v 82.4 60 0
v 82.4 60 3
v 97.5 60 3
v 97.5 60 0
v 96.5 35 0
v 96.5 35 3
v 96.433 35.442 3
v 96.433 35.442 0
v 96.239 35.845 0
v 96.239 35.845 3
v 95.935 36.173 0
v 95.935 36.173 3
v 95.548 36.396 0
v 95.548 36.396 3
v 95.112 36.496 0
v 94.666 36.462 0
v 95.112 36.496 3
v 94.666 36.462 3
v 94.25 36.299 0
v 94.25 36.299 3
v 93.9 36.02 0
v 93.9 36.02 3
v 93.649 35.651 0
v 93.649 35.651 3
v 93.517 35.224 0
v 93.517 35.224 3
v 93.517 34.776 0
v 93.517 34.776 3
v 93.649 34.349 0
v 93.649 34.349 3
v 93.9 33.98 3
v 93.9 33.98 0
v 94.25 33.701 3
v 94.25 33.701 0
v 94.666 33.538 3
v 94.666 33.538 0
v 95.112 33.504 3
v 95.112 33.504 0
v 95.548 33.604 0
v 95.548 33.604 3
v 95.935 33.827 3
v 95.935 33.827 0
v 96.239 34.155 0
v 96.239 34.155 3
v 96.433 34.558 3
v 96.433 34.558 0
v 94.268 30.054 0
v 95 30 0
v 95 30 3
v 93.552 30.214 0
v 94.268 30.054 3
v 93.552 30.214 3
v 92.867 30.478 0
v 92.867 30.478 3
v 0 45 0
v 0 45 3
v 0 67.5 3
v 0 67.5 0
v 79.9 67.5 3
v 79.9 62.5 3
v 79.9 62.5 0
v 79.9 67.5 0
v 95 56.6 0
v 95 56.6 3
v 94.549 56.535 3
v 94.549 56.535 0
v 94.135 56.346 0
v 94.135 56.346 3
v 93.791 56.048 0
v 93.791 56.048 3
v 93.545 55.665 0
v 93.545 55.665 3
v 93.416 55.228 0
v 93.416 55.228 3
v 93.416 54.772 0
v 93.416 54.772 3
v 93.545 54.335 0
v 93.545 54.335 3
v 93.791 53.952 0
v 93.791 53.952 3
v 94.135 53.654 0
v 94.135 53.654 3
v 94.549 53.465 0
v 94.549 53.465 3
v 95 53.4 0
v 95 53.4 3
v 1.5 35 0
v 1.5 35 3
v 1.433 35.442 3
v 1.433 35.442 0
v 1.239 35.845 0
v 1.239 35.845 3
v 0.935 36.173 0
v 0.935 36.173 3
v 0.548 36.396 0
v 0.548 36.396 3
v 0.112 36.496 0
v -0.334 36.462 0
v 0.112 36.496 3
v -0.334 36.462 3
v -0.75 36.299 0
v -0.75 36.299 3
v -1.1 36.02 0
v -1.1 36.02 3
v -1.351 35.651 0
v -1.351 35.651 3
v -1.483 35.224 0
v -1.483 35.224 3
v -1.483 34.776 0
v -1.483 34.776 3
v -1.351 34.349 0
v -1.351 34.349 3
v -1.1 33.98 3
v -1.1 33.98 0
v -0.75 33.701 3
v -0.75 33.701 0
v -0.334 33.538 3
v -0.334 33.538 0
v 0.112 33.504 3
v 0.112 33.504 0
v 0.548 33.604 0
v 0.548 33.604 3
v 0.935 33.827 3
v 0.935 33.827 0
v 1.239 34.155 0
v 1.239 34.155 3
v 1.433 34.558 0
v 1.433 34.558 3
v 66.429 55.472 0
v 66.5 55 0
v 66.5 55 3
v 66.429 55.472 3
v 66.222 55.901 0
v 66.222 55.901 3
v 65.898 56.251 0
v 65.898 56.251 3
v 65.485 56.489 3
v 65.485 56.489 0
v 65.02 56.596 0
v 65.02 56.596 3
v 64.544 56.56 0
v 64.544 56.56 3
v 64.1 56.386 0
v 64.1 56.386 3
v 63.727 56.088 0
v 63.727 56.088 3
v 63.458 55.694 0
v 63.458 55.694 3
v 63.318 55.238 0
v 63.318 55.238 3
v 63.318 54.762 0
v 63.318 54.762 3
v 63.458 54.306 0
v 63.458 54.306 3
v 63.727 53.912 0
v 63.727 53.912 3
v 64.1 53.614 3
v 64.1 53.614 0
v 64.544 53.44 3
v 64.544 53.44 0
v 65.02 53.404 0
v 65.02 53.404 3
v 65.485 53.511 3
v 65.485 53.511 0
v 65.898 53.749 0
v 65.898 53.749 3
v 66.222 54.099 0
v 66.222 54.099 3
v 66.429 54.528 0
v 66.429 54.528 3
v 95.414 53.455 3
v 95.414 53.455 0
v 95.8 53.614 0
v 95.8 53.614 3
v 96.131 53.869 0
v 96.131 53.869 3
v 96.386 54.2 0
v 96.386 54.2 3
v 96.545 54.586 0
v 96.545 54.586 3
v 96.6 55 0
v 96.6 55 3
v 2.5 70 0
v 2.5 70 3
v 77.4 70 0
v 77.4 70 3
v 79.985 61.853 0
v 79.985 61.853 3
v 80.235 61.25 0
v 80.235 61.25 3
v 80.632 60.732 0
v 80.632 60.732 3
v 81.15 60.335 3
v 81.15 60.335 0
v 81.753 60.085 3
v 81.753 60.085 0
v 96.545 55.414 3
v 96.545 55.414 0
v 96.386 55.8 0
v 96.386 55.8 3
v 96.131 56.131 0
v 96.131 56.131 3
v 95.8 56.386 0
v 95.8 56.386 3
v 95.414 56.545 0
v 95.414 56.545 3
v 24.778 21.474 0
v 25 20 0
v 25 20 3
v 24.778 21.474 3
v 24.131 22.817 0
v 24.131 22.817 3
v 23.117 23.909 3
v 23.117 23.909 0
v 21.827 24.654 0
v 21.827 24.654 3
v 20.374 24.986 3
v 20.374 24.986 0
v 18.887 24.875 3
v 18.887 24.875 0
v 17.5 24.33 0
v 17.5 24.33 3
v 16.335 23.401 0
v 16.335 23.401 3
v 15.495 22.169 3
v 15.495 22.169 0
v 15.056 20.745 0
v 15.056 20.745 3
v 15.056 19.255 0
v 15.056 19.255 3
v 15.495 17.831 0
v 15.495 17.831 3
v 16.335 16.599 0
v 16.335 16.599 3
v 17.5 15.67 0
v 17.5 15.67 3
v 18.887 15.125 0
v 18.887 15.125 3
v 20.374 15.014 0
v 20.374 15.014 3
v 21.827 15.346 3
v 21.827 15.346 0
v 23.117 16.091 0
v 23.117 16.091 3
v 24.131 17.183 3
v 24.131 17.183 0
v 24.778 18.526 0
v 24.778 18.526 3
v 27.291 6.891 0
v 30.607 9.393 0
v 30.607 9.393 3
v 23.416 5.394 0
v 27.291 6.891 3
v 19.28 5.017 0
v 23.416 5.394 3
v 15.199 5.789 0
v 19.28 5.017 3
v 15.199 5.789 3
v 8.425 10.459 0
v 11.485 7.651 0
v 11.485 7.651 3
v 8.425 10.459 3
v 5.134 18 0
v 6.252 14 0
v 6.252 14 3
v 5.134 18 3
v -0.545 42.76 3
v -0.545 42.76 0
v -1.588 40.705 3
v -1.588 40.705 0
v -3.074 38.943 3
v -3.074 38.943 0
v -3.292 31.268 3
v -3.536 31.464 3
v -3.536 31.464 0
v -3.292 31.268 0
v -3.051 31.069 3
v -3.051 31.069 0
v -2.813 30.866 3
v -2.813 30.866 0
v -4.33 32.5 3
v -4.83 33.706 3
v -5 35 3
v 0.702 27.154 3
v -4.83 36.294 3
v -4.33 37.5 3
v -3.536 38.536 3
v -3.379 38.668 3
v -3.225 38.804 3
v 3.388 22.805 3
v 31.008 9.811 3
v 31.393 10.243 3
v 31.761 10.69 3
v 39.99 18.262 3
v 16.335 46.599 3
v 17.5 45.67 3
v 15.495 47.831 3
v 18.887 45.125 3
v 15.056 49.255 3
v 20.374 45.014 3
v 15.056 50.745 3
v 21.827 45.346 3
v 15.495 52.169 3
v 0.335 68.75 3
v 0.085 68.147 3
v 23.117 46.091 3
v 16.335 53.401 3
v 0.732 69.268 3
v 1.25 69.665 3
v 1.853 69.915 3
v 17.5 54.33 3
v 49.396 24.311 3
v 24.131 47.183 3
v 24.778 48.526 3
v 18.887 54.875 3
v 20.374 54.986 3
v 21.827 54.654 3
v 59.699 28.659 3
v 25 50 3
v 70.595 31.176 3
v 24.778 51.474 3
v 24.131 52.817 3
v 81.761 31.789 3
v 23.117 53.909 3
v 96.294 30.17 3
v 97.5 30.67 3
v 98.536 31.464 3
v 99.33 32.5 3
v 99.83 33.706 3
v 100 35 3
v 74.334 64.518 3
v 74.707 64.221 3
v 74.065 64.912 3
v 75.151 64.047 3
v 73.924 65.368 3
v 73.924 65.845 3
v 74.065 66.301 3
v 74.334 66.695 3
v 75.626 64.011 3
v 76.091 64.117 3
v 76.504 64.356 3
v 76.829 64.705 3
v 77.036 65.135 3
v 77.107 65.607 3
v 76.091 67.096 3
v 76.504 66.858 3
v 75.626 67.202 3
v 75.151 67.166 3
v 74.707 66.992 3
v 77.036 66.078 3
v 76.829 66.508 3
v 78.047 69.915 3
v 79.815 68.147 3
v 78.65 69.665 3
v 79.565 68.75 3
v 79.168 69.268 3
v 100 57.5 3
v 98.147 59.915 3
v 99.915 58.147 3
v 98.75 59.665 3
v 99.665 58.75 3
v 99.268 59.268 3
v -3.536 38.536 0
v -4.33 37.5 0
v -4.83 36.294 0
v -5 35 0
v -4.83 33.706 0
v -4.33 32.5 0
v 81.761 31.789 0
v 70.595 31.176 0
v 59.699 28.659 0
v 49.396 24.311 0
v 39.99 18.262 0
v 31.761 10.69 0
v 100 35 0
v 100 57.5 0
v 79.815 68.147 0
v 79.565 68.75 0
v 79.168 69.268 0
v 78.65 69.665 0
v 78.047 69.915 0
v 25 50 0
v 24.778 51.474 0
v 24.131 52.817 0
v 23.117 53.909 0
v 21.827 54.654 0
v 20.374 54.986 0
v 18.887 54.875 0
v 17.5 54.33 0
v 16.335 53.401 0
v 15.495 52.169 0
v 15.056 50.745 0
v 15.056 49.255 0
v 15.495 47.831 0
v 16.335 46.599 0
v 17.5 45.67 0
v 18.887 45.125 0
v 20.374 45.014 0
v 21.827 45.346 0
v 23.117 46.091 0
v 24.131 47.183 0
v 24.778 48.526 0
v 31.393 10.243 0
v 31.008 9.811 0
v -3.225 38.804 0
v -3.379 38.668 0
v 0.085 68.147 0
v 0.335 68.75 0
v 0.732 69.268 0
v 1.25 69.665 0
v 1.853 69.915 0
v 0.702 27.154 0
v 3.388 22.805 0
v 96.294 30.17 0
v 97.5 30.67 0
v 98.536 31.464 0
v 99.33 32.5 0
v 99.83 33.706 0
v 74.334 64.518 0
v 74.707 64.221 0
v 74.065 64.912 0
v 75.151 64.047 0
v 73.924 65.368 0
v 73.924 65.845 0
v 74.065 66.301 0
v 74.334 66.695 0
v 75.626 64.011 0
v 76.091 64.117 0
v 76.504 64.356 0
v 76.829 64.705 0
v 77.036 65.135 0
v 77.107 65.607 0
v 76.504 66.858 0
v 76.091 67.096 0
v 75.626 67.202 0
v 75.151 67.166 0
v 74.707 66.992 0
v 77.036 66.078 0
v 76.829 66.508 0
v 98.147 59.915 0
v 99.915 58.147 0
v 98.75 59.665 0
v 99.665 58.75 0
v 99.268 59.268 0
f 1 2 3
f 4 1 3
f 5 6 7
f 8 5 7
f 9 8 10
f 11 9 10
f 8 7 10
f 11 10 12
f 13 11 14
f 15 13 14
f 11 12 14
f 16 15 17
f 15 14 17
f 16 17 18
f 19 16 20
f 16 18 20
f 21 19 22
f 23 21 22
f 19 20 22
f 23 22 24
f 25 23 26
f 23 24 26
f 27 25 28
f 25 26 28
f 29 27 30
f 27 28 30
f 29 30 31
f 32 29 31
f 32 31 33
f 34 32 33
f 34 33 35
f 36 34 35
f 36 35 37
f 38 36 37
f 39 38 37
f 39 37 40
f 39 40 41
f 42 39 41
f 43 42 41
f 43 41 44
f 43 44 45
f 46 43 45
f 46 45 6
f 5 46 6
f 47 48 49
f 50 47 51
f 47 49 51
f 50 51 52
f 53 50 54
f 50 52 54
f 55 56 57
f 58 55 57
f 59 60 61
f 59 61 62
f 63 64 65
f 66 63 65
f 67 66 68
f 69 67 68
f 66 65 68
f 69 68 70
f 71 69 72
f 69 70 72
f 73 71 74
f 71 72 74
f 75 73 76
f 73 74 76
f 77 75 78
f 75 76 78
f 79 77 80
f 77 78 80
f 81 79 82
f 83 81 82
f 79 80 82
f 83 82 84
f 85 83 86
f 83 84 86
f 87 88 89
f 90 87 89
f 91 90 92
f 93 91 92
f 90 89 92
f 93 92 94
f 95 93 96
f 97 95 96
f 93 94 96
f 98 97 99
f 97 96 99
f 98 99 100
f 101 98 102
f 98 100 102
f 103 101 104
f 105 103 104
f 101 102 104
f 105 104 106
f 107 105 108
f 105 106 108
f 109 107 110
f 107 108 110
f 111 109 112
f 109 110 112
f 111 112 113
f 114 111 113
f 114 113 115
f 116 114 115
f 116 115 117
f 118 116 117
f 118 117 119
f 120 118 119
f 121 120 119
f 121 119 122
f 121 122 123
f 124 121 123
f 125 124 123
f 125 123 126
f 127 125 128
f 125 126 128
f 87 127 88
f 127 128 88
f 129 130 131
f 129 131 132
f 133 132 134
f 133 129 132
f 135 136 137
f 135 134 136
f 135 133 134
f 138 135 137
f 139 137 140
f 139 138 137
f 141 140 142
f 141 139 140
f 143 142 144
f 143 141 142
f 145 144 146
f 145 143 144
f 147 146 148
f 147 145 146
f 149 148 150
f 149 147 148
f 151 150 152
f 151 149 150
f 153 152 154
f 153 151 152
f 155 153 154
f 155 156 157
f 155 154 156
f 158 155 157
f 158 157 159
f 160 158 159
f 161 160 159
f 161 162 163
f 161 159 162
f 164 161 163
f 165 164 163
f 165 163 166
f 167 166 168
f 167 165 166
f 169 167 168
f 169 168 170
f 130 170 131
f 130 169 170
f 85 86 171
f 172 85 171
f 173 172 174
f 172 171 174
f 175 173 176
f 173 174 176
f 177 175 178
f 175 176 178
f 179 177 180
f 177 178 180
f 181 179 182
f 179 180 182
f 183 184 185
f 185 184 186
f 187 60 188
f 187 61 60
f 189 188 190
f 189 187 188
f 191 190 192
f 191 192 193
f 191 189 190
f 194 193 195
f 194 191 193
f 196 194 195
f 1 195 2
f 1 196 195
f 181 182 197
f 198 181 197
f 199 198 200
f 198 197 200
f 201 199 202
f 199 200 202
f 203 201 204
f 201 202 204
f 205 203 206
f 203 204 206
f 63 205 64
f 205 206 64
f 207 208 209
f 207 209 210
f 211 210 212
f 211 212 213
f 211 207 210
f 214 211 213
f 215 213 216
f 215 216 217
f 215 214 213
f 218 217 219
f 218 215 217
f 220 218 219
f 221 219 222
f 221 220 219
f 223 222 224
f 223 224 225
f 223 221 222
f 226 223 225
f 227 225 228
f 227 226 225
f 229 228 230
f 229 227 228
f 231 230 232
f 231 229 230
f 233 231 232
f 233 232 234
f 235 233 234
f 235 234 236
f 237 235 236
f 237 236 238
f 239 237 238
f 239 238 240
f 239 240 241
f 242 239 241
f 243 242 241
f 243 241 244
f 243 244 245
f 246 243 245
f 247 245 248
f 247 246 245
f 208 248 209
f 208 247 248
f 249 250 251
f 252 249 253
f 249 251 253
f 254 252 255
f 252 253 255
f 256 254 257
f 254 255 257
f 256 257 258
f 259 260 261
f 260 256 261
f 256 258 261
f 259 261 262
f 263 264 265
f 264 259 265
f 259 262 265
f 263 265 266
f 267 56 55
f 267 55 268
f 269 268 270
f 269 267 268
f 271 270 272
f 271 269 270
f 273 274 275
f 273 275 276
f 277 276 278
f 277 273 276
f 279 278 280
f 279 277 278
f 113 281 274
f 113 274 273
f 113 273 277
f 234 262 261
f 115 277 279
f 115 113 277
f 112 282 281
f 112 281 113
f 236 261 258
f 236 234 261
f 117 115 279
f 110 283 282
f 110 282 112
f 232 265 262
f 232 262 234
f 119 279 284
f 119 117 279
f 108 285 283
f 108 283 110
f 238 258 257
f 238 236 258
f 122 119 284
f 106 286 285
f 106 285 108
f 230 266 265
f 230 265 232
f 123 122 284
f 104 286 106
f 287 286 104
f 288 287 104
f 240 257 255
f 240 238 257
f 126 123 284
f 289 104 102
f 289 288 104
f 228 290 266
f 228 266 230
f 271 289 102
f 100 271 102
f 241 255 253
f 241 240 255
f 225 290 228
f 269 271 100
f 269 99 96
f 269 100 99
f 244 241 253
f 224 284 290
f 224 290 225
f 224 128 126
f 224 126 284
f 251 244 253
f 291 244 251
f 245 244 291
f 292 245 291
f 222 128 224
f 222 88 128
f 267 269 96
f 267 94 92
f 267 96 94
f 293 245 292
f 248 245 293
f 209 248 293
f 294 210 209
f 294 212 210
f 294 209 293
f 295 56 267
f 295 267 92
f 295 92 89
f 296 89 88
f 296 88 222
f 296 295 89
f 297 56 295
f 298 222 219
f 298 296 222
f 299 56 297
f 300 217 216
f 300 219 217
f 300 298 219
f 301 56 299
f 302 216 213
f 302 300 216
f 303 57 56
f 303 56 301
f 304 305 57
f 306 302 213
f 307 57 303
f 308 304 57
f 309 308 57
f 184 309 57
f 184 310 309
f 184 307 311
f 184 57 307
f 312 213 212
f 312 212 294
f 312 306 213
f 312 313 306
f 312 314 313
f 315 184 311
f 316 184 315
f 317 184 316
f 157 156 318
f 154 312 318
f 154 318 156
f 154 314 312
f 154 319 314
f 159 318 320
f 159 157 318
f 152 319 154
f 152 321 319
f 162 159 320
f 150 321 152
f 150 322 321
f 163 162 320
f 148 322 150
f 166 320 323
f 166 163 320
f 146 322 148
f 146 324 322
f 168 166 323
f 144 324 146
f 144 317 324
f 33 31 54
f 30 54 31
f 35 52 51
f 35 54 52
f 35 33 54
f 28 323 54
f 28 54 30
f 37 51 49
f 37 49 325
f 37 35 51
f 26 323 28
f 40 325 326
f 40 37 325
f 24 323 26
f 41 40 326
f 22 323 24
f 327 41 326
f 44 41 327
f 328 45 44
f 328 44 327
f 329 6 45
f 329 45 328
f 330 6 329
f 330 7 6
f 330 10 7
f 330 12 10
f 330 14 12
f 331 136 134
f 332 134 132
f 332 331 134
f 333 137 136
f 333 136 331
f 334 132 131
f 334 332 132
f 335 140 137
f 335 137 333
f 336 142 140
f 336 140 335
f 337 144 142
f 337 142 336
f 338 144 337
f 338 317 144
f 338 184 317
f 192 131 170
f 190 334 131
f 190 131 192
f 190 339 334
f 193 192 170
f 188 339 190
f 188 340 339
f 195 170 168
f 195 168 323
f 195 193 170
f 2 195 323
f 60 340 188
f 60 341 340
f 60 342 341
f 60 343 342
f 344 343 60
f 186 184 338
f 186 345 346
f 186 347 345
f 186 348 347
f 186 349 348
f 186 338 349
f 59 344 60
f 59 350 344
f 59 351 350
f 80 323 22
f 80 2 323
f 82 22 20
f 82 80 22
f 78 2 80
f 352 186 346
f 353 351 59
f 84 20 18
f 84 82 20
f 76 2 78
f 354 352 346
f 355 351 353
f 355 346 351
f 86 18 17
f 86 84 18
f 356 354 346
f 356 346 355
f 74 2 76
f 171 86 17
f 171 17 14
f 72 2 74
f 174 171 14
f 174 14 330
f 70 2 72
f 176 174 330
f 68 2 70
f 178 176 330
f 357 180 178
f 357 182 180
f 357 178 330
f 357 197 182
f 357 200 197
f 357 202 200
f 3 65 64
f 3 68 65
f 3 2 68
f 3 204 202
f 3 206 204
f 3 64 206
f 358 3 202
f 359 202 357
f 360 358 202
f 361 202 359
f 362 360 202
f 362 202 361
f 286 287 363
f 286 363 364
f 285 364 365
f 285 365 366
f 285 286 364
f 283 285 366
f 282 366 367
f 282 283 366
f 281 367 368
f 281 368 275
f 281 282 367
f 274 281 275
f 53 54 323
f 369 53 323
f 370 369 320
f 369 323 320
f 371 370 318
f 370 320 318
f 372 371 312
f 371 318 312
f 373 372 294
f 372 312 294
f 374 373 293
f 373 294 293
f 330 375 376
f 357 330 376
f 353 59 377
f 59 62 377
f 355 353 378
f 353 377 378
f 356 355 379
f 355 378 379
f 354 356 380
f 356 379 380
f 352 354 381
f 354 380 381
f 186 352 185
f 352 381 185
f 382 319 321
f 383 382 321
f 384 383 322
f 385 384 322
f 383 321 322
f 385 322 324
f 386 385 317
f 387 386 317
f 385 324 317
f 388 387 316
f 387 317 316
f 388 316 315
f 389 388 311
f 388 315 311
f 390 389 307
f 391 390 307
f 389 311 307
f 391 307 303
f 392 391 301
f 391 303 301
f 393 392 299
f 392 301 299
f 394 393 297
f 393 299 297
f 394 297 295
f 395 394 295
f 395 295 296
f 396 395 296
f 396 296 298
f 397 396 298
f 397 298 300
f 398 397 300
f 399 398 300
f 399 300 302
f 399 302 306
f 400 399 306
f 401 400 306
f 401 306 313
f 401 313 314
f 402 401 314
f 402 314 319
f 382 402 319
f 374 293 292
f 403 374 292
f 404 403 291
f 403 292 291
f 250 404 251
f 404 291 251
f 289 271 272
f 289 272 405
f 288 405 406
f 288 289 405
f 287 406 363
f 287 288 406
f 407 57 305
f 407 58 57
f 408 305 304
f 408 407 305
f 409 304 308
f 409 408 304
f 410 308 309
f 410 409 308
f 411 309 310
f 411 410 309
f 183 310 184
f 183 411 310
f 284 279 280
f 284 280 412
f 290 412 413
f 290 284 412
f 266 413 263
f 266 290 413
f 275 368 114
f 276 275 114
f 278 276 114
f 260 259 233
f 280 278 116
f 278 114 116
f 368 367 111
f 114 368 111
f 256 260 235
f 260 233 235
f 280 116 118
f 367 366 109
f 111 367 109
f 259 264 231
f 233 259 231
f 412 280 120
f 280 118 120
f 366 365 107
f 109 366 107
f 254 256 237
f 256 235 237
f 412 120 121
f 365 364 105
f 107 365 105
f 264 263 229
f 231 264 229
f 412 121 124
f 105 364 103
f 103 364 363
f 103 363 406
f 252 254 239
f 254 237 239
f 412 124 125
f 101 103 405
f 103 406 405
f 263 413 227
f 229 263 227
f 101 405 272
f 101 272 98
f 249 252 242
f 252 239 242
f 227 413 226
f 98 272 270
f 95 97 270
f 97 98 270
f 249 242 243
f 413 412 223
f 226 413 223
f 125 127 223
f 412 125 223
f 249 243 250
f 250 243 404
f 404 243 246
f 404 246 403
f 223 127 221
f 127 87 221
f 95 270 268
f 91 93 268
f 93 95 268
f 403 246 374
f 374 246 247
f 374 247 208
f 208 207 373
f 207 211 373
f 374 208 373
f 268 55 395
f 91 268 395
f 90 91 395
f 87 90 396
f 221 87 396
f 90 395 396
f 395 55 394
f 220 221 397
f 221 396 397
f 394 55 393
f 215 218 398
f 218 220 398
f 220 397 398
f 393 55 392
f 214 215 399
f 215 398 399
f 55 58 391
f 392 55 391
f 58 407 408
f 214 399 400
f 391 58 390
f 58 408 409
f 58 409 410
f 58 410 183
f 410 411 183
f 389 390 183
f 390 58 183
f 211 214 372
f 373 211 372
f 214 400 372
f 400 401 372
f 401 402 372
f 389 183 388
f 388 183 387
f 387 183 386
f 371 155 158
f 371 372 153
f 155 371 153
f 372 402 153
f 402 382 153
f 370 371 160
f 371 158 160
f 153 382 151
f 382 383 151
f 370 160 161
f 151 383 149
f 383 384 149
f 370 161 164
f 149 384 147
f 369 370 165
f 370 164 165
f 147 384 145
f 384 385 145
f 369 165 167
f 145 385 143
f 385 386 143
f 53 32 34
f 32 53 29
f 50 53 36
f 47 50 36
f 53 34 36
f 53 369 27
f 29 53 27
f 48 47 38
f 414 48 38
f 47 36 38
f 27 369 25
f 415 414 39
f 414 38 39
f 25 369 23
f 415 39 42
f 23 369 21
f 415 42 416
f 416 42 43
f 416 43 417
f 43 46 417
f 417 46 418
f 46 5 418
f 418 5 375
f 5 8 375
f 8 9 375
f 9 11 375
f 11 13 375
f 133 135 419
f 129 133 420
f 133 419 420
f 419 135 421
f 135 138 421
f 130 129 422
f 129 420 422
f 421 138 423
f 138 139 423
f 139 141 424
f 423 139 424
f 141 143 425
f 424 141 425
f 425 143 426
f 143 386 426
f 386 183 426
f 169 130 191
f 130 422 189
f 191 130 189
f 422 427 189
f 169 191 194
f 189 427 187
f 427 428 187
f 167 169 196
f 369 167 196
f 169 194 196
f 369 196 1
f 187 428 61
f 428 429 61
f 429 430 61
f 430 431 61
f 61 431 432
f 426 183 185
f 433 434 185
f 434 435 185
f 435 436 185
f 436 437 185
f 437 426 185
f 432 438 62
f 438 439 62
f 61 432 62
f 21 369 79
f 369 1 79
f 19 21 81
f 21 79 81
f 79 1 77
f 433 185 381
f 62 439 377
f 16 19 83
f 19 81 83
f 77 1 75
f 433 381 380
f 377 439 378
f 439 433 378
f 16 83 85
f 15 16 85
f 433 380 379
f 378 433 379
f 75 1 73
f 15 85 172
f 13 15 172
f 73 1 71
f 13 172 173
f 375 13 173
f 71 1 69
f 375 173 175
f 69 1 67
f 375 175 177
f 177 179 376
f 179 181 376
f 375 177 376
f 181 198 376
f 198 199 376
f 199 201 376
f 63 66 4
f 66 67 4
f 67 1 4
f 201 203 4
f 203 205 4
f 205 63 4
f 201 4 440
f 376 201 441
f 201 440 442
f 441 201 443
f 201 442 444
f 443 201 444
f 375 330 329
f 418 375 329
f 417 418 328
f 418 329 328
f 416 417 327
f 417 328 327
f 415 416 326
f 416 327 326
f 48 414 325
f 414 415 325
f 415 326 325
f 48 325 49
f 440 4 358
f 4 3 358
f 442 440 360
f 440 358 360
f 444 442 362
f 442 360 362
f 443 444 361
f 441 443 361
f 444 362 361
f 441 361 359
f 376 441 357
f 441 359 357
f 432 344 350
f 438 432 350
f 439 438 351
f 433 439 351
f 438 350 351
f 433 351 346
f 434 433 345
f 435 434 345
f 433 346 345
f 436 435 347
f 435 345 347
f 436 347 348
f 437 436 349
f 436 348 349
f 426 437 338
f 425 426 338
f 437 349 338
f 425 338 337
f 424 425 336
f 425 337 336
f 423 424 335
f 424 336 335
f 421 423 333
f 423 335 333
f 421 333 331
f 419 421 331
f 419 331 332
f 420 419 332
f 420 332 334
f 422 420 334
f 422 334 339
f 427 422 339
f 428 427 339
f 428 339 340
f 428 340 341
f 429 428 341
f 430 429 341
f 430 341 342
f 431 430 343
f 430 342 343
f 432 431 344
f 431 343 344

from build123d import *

# Parameters (mm, degrees)
SKETCH_1_R               = 5
SKETCH_1_R_2             = 2.15
EXTRUDE_1_DEPTH          = 3
SKETCH_2_R               = 1.5
CUT_EXTRUDE_1_DEPTH      = 117.657618697
CUT_EXTRUDE_3_DEPTH      = 117.657618697
SKETCH_5_W               = 40
SKETCH_5_H               = 20
SKETCH_5_R               = 2.15
EXTRUDE_2_DEPTH          = 3
SKETCH_6_R               = 5
CUT_EXTRUDE_4_DEPTH      = 117.657618697
SKETCH_7_R               = 1.5
EXTRUDE_4_DEPTH          = 3
CUT_EXTRUDE_6_DEPTH      = 117.657618697
CUT_EXTRUDE_6_DEPTH_BACK = 117.657618697
SKETCH_9_R               = 1.6
CUT_EXTRUDE_7_DEPTH      = 117.657618697
SKETCH_10_W              = 79.9
SKETCH_10_H              = 10
SKETCH_10_R              = 1.6
EXTRUDE_5_DEPTH          = 3
FILLET_1_R               = 2.5


with BuildPart() as part:
    # ｽｹｯﾁ1 → ﾎﾞｽ - 押し出し1 (new body)
    with BuildSketch(Plane.XY):
        Polygon((10, 60), (0, 60), (0, 0), (100, 0), (100, 50), (100, 60), (50, 60), (50, 40), (10, 40), align=None)
        with Locations((20, 20)):
            Circle(SKETCH_1_R, mode=Mode.SUBTRACT)
        with Locations((5.25, 45)):
            Circle(SKETCH_1_R_2, mode=Mode.SUBTRACT)
        with Locations((5.25, 55)):
            Circle(SKETCH_1_R_2, mode=Mode.SUBTRACT)
        with Locations((54.75, 45)):
            Circle(SKETCH_1_R_2, mode=Mode.SUBTRACT)
        with Locations((54.75, 55)):
            Circle(SKETCH_1_R_2, mode=Mode.SUBTRACT)
    extrude(amount=EXTRUDE_1_DEPTH)

    # ｽｹｯﾁ2 → ｶｯﾄ - 押し出し1 (cut, through all)
    with BuildSketch(Plane.XY.offset(3)):
        with Locations((95, 35)):
            Circle(SKETCH_2_R)
    extrude(amount=-CUT_EXTRUDE_1_DEPTH, mode=Mode.SUBTRACT)

    # ｽｹｯﾁ4 → ｶｯﾄ - 押し出し3 (cut, through all)
    with BuildSketch(Plane.XY.offset(3)):
        with BuildLine():
            ThreePointArc((30.606601718, 9.393398282), (11.666446505, 7.527955815), (6.141807012, 25.740251485))
            ThreePointArc((6.141807012, 25.740251485), (5.992593584, 34.011854082), (1.731818145, 41.103219734))
            ThreePointArc((1.731818145, 41.103219734), (1.633577382, 41.194216579), (1.537689399, 41.287689399))
            ThreePointArc((1.537689399, 41.287689399), (0.399632454, 42.99091198), (0, 45))
            Line((0, 45), (0, 0))
            Line((0, 0), (100, 0))
            Line((100, 0), (100, 35))
            ThreePointArc((100, 35), (98.535533906, 31.464466094), (95, 30))
            ThreePointArc((95, 30), (93.906844507, 30.120962075), (92.866581158, 30.477995572))
            ThreePointArc((92.866581158, 30.477995572), (59.698938801, 28.658859349), (31.76111788, 10.689999666))
            ThreePointArc((31.76111788, 10.689999666), (31.202634234, 10.024981894), (30.606601718, 9.393398282))
        make_face()
    extrude(amount=-CUT_EXTRUDE_3_DEPTH, mode=Mode.SUBTRACT)

    # ｽｹｯﾁ5 → ﾎﾞｽ - 押し出し2 (add, through all)
    with BuildSketch(Plane.XY.offset(3)):
        with Locations((30, 50)):
            Rectangle(SKETCH_5_W, SKETCH_5_H)
        with Locations((5.25, 55)):
            Circle(SKETCH_5_R)
        with Locations((5.25, 45)):
            Circle(SKETCH_5_R)
        with Locations((54.75, 45)):
            Circle(SKETCH_5_R)
        with Locations((54.75, 55)):
            Circle(SKETCH_5_R)
    extrude(amount=-EXTRUDE_2_DEPTH)

    # ｽｹｯﾁ6 → ｶｯﾄ - 押し出し4 (cut, through all)
    with BuildSketch(Plane.XY.offset(3)):
        with Locations((20, 50)):
            Circle(SKETCH_6_R)
    extrude(amount=-CUT_EXTRUDE_4_DEPTH, mode=Mode.SUBTRACT)

    # ｽｹｯﾁ7 → ﾎﾞｽ - 押し出し4 (add, through all)
    # profile 1 of 2: a face of its own
    with BuildSketch(Plane.XY.offset(3)):
        with BuildLine():
            ThreePointArc((0, 45), (-1.007160055, 41.702552665), (-3.074339462, 38.943150628))
            ThreePointArc((-3.074339462, 38.943150628), (2.194117441, 39.492866419), (5, 35))
            ThreePointArc((5, 35), (2.338239569, 30.580425844), (-2.813054288, 30.866390733))
            ThreePointArc((-2.813054288, 30.866390733), (2.156646174, 25.048507639), (5.133931253, 18))
            ThreePointArc((5.133931253, 18), (5.125569714, 21.936833416), (6.141807012, 25.740251485))
            ThreePointArc((6.141807012, 25.740251485), (5.992593584, 34.011854082), (1.731818145, 41.103219734))
            ThreePointArc((1.731818145, 41.103219734), (0.4524509, 42.867859613), (0, 45))
        make_face()
    # profile 2 of 2: a face of its own
    with BuildSketch(Plane.XY.offset(3)):
        with BuildLine():
            ThreePointArc((-3.074339462, 38.943150628), (-3.301799792, 38.735793058), (-3.535533906, 38.535533906))
            ThreePointArc((-3.535533906, 38.535533906), (-5, 35), (-3.535533906, 31.464466094))
            ThreePointArc((-3.535533906, 31.464466094), (-3.171489153, 31.168816808), (-2.813054288, 30.866390733))
            ThreePointArc((-2.813054288, 30.866390733), (2.338239569, 30.580425844), (5, 35))
            ThreePointArc((5, 35), (2.194117441, 39.492866419), (-3.074339462, 38.943150628))
        make_face()
        with Locations((0, 35)):
            Circle(SKETCH_7_R, mode=Mode.SUBTRACT)
    extrude(amount=-EXTRUDE_4_DEPTH)

    # ｽｹｯﾁ9 → ｶｯﾄ - 押し出し6 (cut, two sides: drawn at the far end of the back side and taken through both)
    with BuildSketch(Plane.XY.offset(3).offset(-CUT_EXTRUDE_6_DEPTH_BACK)):
        with Locations((64.9, 55)):
            Circle(SKETCH_9_R)
    extrude(amount=CUT_EXTRUDE_6_DEPTH + CUT_EXTRUDE_6_DEPTH_BACK, mode=Mode.SUBTRACT)

    # ｽｹｯﾁ8 → ｶｯﾄ - 押し出し7 (cut, through all)
    with BuildSketch(Plane.XY.offset(3)):
        with BuildLine():
            ThreePointArc((95, 56.6), (93.4, 55), (95, 53.4))
            Line((95, 53.4), (95, 56.6))
        make_face()
        with BuildLine():
            Line((95, 56.6), (95, 53.4))
            ThreePointArc((95, 53.4), (96.13137085, 53.86862915), (96.6, 55))
            ThreePointArc((96.6, 55), (96.13137085, 56.13137085), (95, 56.6))
        make_face()
    extrude(amount=-CUT_EXTRUDE_7_DEPTH, mode=Mode.SUBTRACT)

    # ｽｹｯﾁ10 → ﾎﾞｽ - 押し出し5 (add, through all)
    with BuildSketch(Plane.XY.offset(3)):
        with Locations((39.95, 65)):
            Rectangle(SKETCH_10_W, SKETCH_10_H)
        with Locations((75.506601718, 65.606601718)):
            Circle(SKETCH_10_R, mode=Mode.SUBTRACT)
    extrude(amount=-EXTRUDE_5_DEPTH)

    # ﾌｨﾚｯﾄ1
    fillet_1_edges = [part.edges().sort_by_distance(p)[0] for p in [
        (0, 70, 1.5),
        (79.9, 70, 1.5),
        (79.9, 60, 1.5),
        (100, 60, 1.5),
    ]]
    fillet(fillet_1_edges, radius=FILLET_1_R)


solid = part.part
